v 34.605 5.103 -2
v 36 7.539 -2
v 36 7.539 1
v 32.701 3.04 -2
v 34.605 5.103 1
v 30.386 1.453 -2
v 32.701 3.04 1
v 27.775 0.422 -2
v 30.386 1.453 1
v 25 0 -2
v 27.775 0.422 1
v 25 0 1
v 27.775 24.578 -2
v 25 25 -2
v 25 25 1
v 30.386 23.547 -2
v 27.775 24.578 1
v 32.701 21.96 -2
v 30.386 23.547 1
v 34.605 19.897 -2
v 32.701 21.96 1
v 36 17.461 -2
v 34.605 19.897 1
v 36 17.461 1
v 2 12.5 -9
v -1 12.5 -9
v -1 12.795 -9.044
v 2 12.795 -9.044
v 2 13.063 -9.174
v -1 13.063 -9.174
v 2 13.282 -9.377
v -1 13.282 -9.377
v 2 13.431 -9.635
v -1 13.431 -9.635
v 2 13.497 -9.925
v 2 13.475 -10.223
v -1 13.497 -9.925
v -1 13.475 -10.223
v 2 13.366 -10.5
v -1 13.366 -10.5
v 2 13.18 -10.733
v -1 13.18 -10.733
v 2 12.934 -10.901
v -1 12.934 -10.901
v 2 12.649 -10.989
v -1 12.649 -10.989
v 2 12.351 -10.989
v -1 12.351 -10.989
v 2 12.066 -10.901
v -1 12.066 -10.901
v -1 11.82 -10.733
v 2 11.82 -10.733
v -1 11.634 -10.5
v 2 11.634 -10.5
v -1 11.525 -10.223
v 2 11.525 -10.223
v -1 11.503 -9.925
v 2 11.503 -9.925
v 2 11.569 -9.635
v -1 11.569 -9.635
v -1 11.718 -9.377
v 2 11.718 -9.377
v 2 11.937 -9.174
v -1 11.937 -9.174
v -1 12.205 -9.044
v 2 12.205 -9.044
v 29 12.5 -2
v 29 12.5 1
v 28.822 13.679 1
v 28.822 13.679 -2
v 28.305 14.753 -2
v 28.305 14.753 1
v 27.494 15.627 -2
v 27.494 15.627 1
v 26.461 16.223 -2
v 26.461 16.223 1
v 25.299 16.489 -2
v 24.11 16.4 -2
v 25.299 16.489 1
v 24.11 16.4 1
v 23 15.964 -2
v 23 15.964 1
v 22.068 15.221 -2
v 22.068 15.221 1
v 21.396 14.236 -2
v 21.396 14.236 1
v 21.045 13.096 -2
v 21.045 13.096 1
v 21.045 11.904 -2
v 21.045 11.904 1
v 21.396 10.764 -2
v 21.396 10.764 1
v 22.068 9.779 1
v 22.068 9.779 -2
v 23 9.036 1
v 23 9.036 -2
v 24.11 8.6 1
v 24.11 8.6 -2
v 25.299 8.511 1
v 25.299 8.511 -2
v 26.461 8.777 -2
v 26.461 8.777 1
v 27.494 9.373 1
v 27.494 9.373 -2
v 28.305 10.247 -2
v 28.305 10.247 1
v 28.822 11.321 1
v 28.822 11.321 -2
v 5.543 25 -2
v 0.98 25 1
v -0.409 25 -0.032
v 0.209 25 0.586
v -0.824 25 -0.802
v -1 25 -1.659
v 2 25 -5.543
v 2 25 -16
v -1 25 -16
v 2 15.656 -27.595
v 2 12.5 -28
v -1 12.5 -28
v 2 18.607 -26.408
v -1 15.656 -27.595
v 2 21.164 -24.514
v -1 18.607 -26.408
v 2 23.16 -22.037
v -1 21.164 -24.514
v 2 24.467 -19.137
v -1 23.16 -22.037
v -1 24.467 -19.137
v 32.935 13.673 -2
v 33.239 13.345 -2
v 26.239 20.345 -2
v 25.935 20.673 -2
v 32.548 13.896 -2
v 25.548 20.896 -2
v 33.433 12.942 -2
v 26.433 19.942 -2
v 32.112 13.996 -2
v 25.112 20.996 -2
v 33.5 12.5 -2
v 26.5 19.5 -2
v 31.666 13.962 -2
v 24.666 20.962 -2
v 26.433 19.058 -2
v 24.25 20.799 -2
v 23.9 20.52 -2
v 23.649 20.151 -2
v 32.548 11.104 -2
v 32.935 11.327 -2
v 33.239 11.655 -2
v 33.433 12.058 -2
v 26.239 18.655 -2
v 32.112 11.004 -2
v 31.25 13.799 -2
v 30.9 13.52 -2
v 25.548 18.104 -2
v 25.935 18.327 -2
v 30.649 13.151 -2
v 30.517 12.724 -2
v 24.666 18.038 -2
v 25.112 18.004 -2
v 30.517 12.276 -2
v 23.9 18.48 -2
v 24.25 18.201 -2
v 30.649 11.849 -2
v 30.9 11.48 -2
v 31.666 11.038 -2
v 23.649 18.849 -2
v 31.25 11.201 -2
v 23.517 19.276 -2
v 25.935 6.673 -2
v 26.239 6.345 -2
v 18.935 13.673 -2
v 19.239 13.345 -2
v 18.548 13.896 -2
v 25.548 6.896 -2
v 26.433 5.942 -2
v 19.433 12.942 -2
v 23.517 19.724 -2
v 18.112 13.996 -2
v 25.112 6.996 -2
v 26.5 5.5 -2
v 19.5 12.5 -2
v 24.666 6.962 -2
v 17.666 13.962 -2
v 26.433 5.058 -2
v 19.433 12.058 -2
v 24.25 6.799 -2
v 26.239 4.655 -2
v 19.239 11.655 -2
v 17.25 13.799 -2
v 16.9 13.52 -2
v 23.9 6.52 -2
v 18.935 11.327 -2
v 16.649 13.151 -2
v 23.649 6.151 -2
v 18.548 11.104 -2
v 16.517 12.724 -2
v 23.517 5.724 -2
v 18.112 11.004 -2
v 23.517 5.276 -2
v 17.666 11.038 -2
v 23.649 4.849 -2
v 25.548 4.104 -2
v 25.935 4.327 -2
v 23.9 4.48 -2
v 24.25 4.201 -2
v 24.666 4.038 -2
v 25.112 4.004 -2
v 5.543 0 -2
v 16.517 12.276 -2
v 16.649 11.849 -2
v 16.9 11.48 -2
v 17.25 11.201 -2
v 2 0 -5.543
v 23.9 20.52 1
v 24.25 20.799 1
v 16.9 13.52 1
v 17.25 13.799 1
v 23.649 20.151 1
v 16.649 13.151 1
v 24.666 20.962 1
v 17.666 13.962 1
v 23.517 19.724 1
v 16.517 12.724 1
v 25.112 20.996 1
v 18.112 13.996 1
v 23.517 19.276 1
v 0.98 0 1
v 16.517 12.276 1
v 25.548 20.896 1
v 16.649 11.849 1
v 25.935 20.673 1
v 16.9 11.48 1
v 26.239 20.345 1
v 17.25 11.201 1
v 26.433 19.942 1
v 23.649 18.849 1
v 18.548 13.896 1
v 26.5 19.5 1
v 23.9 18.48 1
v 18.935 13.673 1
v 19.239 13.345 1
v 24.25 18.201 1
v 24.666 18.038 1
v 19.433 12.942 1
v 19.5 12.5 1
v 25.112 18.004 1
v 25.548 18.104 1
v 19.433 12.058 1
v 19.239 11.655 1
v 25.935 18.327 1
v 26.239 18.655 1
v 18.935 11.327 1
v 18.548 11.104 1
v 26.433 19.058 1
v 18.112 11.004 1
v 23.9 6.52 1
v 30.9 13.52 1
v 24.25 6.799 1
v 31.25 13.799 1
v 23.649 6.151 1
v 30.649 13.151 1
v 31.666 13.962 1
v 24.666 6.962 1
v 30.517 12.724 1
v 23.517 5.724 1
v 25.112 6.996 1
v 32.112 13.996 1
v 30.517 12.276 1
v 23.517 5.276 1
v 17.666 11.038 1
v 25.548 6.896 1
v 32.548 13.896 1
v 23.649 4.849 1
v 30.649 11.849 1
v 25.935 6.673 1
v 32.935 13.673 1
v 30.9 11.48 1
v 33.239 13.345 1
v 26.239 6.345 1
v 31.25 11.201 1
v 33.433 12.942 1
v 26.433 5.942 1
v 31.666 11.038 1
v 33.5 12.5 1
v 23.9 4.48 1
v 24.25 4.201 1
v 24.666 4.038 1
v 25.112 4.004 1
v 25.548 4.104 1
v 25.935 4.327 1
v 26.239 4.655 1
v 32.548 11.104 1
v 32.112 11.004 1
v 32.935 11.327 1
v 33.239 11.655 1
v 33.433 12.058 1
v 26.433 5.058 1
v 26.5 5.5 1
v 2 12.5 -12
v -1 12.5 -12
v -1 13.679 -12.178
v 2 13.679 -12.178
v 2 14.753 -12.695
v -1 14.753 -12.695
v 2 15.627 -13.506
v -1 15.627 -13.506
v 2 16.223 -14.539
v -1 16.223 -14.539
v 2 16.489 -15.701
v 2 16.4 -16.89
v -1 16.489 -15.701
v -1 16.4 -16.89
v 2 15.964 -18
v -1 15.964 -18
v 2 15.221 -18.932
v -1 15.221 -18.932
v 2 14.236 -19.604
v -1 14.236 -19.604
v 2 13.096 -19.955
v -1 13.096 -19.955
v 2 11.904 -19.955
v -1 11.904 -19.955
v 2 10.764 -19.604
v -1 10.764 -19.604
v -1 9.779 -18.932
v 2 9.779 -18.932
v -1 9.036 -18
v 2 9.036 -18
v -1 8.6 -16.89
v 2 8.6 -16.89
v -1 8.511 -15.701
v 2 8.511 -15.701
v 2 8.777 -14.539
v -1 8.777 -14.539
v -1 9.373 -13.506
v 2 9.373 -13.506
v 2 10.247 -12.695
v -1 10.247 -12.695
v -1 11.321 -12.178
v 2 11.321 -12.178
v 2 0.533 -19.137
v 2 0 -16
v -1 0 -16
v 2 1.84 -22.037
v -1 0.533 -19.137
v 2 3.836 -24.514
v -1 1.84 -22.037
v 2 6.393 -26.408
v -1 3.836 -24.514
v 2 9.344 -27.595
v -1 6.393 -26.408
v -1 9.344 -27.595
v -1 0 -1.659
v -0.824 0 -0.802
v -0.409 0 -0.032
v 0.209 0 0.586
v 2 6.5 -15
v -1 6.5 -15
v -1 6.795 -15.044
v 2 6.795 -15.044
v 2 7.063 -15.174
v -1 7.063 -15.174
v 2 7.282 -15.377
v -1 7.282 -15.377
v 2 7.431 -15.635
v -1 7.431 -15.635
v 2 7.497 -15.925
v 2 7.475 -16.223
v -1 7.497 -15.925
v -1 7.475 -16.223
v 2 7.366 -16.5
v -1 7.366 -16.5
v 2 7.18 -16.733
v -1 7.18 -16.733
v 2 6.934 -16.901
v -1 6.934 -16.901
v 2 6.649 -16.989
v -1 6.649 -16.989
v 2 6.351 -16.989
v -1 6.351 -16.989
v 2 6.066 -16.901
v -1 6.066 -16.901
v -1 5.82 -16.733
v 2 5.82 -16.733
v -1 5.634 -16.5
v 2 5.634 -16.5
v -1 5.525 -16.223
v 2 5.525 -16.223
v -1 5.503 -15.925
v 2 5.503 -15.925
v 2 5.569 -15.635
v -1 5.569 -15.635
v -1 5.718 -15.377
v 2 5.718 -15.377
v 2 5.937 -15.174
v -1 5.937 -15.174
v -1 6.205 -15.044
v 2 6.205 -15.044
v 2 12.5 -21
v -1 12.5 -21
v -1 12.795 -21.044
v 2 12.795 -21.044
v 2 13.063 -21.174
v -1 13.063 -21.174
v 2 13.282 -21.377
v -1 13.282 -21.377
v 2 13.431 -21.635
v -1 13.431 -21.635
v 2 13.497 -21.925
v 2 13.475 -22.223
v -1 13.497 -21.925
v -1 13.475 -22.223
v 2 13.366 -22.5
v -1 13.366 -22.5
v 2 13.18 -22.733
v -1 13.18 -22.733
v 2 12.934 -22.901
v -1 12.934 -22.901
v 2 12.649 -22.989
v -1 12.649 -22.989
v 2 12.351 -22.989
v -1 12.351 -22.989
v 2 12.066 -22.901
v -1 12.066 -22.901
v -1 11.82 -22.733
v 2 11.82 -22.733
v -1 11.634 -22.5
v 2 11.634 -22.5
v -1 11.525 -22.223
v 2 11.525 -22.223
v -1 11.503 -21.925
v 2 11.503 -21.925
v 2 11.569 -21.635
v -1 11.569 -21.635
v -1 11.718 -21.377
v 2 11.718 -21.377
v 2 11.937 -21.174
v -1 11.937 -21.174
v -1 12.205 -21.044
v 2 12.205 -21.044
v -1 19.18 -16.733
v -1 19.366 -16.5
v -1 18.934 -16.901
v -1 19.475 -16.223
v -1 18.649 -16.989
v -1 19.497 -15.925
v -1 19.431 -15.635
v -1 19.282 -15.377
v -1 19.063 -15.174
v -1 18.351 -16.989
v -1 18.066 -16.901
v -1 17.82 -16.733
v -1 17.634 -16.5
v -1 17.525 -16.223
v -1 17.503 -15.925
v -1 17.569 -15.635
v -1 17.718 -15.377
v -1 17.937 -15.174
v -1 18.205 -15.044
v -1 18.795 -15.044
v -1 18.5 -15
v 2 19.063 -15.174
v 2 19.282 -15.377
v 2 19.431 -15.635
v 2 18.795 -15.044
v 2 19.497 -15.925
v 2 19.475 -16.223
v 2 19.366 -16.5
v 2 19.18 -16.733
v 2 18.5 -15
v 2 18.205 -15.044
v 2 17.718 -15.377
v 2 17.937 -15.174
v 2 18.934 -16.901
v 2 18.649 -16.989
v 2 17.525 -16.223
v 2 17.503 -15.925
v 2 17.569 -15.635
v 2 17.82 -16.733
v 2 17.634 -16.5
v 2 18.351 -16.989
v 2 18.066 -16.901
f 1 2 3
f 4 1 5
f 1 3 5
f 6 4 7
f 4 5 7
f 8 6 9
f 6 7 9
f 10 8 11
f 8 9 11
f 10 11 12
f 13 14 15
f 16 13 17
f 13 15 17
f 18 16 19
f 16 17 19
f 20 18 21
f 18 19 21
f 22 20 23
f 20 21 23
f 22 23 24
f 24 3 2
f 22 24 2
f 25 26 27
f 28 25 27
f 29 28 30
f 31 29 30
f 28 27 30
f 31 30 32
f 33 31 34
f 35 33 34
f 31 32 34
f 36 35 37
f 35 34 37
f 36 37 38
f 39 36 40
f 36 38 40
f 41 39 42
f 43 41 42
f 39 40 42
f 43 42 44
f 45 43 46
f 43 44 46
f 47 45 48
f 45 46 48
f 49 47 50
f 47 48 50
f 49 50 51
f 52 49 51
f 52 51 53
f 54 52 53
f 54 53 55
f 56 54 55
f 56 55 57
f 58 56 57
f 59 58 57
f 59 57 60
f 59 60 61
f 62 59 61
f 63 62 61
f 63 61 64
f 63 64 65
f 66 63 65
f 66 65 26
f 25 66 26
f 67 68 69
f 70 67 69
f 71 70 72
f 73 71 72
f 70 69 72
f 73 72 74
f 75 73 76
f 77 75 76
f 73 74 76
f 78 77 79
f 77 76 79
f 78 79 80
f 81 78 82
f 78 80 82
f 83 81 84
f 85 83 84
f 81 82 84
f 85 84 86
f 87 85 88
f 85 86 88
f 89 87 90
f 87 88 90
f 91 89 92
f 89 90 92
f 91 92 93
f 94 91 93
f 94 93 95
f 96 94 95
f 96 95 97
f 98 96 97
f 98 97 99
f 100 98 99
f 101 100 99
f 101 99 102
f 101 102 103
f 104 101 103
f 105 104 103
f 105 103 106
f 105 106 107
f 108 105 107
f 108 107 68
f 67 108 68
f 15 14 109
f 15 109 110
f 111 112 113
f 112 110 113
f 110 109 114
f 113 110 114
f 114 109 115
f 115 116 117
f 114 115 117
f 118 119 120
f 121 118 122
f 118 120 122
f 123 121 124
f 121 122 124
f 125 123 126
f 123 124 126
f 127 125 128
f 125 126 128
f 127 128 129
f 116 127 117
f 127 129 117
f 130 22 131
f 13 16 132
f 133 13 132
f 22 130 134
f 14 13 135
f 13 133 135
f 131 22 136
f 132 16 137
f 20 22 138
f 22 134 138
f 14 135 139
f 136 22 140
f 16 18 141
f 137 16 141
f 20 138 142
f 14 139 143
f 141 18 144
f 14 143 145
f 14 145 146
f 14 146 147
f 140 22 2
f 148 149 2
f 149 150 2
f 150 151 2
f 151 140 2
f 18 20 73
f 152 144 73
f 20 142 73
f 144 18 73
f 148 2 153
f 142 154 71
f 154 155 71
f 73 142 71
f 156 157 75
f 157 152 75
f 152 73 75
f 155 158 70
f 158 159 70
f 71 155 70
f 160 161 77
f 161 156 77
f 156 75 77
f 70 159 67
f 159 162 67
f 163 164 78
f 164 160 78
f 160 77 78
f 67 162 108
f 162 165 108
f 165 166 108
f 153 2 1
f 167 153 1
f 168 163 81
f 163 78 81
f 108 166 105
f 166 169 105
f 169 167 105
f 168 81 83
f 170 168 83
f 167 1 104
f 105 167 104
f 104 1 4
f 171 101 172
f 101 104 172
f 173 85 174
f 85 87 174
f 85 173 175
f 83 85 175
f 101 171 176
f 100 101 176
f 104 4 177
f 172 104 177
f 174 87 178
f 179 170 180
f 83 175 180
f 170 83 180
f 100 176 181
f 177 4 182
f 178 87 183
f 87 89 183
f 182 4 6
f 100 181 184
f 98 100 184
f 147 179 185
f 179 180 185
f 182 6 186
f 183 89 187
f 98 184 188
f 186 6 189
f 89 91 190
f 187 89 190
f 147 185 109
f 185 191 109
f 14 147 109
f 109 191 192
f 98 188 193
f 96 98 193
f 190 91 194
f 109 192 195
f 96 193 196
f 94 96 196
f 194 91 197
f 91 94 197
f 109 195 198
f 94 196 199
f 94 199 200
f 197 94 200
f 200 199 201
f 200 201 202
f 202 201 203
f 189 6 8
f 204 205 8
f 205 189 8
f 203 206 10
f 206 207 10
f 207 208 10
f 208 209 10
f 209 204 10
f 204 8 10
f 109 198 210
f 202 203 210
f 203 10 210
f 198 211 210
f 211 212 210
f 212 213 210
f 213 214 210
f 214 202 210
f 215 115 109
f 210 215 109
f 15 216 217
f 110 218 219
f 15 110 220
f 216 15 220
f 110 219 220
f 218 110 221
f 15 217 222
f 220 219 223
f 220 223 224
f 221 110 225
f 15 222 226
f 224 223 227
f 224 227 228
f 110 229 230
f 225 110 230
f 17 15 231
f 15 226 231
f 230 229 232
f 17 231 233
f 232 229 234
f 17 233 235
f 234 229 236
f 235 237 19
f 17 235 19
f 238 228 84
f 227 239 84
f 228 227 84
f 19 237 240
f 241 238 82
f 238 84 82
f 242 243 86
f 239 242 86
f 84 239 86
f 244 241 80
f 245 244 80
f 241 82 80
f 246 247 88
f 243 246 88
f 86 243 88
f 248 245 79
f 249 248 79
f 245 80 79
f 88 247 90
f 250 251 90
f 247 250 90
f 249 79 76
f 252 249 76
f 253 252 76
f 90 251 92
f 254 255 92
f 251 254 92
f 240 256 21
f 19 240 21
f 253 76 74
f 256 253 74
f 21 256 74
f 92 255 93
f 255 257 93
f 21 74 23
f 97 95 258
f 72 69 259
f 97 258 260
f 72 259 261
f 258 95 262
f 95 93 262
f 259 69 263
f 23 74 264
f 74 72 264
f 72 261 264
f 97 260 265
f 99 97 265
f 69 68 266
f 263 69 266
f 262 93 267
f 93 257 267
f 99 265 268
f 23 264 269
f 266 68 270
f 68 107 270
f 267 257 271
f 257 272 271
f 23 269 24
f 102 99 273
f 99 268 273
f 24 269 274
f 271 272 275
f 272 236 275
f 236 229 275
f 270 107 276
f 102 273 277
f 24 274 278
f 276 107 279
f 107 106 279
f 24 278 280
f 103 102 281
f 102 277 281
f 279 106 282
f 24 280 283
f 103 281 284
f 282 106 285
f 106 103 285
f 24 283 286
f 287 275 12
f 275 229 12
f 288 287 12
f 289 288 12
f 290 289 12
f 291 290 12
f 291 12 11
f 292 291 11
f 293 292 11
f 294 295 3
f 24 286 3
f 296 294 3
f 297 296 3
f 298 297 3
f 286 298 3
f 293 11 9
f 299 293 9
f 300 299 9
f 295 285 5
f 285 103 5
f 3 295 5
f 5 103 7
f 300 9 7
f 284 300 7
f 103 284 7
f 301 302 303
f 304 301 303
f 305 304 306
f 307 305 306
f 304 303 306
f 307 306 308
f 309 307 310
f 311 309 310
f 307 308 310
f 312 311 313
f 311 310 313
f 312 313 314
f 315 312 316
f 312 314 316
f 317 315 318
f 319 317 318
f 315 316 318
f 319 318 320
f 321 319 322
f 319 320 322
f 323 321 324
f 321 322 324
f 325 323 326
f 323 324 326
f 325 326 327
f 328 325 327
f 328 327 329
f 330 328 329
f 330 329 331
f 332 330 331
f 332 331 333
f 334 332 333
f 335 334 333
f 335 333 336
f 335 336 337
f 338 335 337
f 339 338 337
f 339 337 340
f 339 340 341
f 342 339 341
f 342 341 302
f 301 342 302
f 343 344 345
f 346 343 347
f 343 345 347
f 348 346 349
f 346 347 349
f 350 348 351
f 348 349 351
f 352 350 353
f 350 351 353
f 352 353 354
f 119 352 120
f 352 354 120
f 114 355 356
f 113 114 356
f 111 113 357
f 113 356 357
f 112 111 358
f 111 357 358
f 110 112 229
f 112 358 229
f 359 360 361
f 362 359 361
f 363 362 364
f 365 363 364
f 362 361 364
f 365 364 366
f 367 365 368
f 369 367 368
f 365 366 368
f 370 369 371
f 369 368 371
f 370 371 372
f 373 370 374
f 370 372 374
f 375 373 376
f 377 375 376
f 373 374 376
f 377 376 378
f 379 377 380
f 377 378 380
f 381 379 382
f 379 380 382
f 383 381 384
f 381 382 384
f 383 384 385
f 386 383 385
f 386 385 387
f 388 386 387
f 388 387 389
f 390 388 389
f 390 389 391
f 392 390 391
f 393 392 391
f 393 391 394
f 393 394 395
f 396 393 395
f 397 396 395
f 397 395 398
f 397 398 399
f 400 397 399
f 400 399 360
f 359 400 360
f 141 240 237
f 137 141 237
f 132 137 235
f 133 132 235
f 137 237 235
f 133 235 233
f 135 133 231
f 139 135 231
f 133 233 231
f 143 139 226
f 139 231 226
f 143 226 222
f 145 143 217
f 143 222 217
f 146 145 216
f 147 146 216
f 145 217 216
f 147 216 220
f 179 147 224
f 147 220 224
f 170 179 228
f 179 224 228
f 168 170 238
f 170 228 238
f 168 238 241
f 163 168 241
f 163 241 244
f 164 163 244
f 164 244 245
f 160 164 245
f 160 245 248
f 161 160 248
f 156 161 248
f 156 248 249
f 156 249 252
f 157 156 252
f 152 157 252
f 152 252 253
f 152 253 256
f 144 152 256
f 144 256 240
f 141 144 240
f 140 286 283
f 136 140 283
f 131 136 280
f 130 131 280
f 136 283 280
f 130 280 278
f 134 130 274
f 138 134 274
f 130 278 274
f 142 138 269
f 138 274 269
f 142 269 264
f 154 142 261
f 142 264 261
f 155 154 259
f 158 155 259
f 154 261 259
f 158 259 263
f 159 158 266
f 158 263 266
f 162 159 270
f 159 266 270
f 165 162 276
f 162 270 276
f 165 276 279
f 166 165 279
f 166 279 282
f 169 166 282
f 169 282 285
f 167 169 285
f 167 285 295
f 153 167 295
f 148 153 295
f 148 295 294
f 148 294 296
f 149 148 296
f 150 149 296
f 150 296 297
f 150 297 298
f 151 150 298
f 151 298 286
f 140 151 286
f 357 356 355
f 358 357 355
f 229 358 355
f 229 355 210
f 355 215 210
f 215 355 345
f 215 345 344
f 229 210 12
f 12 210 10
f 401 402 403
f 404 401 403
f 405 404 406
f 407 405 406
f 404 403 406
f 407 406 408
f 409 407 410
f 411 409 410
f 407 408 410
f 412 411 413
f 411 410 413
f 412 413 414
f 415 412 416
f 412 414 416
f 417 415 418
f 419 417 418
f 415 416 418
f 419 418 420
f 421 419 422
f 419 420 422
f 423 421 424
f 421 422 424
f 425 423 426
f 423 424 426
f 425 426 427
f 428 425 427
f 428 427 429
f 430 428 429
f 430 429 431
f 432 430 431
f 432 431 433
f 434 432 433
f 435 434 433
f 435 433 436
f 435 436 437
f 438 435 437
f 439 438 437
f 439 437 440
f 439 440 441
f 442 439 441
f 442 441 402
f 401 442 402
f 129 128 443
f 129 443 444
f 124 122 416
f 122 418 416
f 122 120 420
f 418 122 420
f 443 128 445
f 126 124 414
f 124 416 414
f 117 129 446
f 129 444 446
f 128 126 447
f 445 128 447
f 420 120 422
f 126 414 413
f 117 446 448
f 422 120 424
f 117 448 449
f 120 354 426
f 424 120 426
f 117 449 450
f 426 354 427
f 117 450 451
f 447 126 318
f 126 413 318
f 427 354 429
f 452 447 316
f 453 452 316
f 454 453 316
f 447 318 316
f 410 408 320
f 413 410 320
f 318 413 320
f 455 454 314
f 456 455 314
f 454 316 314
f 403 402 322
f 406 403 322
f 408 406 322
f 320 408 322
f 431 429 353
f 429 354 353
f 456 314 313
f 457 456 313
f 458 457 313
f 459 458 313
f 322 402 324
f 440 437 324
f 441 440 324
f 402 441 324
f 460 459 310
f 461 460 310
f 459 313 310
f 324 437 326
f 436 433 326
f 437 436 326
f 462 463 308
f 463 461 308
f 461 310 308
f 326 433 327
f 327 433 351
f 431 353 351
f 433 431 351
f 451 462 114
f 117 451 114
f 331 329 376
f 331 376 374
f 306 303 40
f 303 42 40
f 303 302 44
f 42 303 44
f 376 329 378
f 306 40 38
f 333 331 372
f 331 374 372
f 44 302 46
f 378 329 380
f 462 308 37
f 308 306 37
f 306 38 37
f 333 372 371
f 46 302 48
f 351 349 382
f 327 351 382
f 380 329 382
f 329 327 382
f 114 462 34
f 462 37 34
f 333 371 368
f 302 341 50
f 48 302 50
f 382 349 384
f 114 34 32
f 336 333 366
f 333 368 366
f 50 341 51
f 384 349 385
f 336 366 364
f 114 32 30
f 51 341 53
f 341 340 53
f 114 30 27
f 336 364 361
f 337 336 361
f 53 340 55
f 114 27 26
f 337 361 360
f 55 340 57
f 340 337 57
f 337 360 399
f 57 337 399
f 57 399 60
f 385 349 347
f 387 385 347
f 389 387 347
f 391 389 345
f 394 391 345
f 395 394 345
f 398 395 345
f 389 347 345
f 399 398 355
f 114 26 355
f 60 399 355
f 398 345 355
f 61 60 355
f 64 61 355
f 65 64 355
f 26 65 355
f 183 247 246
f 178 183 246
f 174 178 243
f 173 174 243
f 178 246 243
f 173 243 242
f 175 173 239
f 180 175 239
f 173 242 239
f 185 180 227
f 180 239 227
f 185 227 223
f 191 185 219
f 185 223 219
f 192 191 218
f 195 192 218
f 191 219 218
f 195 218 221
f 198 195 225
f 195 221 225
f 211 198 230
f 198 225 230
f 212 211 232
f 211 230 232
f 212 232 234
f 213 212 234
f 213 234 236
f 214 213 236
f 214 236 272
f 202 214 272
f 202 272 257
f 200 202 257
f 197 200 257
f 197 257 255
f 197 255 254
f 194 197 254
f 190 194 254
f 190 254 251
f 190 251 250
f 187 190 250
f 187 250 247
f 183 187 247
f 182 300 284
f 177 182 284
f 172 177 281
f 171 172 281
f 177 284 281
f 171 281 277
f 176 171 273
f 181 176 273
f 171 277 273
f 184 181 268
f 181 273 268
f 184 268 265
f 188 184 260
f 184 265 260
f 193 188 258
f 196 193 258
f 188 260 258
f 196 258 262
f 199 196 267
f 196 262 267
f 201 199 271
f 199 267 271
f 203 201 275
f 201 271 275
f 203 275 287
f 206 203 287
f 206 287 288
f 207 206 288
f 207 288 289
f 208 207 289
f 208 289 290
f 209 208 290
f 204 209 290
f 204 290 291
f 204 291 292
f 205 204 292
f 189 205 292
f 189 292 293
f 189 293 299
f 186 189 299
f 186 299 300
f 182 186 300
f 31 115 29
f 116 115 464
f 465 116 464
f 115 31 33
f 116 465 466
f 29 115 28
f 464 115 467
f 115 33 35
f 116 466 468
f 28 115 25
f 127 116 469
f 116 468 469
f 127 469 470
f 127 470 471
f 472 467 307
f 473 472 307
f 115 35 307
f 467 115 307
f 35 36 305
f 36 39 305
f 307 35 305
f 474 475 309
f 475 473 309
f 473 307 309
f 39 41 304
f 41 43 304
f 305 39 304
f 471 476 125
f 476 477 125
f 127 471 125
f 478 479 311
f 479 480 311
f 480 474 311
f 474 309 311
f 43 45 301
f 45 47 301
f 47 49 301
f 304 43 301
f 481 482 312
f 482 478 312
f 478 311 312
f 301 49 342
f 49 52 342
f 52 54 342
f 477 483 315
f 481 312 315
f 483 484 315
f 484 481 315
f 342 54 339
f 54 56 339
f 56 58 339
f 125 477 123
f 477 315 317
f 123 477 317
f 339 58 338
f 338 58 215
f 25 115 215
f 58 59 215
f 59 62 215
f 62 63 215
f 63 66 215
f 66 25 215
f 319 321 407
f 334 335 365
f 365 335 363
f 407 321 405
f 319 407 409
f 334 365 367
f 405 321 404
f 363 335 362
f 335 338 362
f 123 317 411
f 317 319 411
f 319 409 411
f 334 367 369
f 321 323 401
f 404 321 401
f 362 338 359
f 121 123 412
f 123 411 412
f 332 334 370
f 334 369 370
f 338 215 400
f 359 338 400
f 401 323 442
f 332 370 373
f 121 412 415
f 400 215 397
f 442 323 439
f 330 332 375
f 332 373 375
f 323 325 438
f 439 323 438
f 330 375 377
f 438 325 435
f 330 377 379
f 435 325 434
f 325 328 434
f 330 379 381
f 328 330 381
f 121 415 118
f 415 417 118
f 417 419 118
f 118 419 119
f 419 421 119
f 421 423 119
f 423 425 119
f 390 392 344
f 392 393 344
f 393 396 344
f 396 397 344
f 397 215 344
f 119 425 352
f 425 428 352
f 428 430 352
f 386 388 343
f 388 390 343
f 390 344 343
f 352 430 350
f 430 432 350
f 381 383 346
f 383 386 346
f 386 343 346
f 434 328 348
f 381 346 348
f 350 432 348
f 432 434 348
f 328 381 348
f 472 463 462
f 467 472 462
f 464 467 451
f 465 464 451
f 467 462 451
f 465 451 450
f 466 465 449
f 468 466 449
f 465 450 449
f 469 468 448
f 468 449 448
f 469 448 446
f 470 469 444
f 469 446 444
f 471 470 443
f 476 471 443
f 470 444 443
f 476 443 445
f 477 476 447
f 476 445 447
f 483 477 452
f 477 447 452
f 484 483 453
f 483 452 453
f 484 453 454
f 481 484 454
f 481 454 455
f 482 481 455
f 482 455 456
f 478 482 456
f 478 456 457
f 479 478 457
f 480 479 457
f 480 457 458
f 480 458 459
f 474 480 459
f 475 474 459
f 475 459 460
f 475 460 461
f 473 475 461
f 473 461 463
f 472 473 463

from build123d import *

# Parameters (mm, degrees)
BOSS_EXTRUDE1_DEPTH = 25
CUT_EXTRUDE1_DEPTH  = 25
CUT_EXTRUDE2_DEPTH  = 25
SKETCH5_R           = 4
SKETCH5_R_2         = 1.5
CUT_EXTRUDE3_DEPTH  = 25
SKETCH6_R           = 4
SKETCH6_R_2         = 1
CUT_EXTRUDE4_DEPTH  = 25
BOSS_EXTRUDE2_DEPTH = 25


with BuildPart() as part:
    # Sketch1 → Boss-Extrude1 (new body)
    with BuildSketch(Plane(origin=(0, 0, 0), x_dir=(1, 0, 0), z_dir=(0, 1, 0))):
        with BuildLine():
            ThreePointArc((-1, 1.659075407), (-0.409273776, 0.032355851), (0.979760199, -1))
            Line((0.979760199, -1), (3.029390137, -1))
            Line((3.029390137, -1), (36, -1))
            Line((36, -1), (36, 2))
            Line((36, 2), (3.038729714, 2))
            ThreePointArc((3.038729714, 2), (3.003147911, 1.999369152), (2.967566108, 2))
            ThreePointArc((2.967566108, 2), (2.293369144, 2.293369144), (2, 2.967566108))
            Line((2, 2.967566108), (2, 28))
            Line((2, 28), (-1, 28))
            Line((-1, 28), (-1, 2))
            Line((-1, 2), (-1, 1.659075407))
        make_face()
    extrude(amount=BOSS_EXTRUDE1_DEPTH)

    # Sketch2 → Cut-Extrude1 (cut)
    with BuildSketch(Plane.ZY.offset(1)):
        with BuildLine():
            ThreePointArc((-28, 12.5), (-24.514439297, 21.163861726), (-16, 25))
            Line((-16, 25), (-28, 25))
            Line((-28, 25), (-28, 12.5))
        make_face()
        with BuildLine():
            ThreePointArc((-16, 0), (-24.514439297, 3.836138274), (-28, 12.5))
            Line((-28, 12.5), (-28, 0))
            Line((-28, 0), (-16, 0))
        make_face()
    extrude(amount=-CUT_EXTRUDE1_DEPTH, mode=Mode.SUBTRACT)

    # Sketch4 → Cut-Extrude2 (cut)
    with BuildSketch(Plane.XY.offset(1)):
        with BuildLine():
            Line((36, 25), (25, 25))
            ThreePointArc((25, 25), (31.588282141, 22.818684163), (36, 17.461413786))
            Line((36, 17.461413786), (36, 25))
        make_face()
        with BuildLine():
            Line((36, 0), (36, 7.538586214))
            ThreePointArc((36, 7.538586214), (31.588282141, 2.181315837), (25, 0))
            Line((25, 0), (36, 0))
        make_face()
    extrude(amount=-CUT_EXTRUDE2_DEPTH, mode=Mode.SUBTRACT)

    # Sketch5 → Cut-Extrude3 (cut)
    with BuildSketch(Plane.XY.offset(1)):
        with Locations((25, 12.5)):
            Circle(SKETCH5_R)
        with Locations((25, 19.5)):
            Circle(SKETCH5_R_2)
        with Locations((32, 12.5)):
            Circle(SKETCH5_R_2)
        with Locations((25, 5.5)):
            Circle(SKETCH5_R_2)
        with Locations((18, 12.5)):
            Circle(SKETCH5_R_2)
    extrude(amount=-CUT_EXTRUDE3_DEPTH, mode=Mode.SUBTRACT)

    # Sketch6 → Cut-Extrude4 (cut)
    with BuildSketch(Plane.ZY.offset(1)):
        with Locations((-16, 12.5)):
            Circle(SKETCH6_R)
        with Locations((-16, 18.5)):
            Circle(SKETCH6_R_2)
        with Locations((-10, 12.5)):
            Circle(SKETCH6_R_2)
        with Locations((-16, 6.5)):
            Circle(SKETCH6_R_2)
        with Locations((-22, 12.5)):
            Circle(SKETCH6_R_2)
    extrude(amount=-CUT_EXTRUDE4_DEPTH, mode=Mode.SUBTRACT)

    # Sketch7 → Boss-Extrude2 (add)
    with BuildSketch(Plane(origin=(0, 25, 0), x_dir=(1, 0, 0), z_dir=(0, 1, 0))):
        Polygon((0.998168154, 6.545186747), (6.456382716, 1.086972186), (0.998168154, 1.086972186), align=None)
    extrude(amount=-BOSS_EXTRUDE2_DEPTH)


solid = part.part
